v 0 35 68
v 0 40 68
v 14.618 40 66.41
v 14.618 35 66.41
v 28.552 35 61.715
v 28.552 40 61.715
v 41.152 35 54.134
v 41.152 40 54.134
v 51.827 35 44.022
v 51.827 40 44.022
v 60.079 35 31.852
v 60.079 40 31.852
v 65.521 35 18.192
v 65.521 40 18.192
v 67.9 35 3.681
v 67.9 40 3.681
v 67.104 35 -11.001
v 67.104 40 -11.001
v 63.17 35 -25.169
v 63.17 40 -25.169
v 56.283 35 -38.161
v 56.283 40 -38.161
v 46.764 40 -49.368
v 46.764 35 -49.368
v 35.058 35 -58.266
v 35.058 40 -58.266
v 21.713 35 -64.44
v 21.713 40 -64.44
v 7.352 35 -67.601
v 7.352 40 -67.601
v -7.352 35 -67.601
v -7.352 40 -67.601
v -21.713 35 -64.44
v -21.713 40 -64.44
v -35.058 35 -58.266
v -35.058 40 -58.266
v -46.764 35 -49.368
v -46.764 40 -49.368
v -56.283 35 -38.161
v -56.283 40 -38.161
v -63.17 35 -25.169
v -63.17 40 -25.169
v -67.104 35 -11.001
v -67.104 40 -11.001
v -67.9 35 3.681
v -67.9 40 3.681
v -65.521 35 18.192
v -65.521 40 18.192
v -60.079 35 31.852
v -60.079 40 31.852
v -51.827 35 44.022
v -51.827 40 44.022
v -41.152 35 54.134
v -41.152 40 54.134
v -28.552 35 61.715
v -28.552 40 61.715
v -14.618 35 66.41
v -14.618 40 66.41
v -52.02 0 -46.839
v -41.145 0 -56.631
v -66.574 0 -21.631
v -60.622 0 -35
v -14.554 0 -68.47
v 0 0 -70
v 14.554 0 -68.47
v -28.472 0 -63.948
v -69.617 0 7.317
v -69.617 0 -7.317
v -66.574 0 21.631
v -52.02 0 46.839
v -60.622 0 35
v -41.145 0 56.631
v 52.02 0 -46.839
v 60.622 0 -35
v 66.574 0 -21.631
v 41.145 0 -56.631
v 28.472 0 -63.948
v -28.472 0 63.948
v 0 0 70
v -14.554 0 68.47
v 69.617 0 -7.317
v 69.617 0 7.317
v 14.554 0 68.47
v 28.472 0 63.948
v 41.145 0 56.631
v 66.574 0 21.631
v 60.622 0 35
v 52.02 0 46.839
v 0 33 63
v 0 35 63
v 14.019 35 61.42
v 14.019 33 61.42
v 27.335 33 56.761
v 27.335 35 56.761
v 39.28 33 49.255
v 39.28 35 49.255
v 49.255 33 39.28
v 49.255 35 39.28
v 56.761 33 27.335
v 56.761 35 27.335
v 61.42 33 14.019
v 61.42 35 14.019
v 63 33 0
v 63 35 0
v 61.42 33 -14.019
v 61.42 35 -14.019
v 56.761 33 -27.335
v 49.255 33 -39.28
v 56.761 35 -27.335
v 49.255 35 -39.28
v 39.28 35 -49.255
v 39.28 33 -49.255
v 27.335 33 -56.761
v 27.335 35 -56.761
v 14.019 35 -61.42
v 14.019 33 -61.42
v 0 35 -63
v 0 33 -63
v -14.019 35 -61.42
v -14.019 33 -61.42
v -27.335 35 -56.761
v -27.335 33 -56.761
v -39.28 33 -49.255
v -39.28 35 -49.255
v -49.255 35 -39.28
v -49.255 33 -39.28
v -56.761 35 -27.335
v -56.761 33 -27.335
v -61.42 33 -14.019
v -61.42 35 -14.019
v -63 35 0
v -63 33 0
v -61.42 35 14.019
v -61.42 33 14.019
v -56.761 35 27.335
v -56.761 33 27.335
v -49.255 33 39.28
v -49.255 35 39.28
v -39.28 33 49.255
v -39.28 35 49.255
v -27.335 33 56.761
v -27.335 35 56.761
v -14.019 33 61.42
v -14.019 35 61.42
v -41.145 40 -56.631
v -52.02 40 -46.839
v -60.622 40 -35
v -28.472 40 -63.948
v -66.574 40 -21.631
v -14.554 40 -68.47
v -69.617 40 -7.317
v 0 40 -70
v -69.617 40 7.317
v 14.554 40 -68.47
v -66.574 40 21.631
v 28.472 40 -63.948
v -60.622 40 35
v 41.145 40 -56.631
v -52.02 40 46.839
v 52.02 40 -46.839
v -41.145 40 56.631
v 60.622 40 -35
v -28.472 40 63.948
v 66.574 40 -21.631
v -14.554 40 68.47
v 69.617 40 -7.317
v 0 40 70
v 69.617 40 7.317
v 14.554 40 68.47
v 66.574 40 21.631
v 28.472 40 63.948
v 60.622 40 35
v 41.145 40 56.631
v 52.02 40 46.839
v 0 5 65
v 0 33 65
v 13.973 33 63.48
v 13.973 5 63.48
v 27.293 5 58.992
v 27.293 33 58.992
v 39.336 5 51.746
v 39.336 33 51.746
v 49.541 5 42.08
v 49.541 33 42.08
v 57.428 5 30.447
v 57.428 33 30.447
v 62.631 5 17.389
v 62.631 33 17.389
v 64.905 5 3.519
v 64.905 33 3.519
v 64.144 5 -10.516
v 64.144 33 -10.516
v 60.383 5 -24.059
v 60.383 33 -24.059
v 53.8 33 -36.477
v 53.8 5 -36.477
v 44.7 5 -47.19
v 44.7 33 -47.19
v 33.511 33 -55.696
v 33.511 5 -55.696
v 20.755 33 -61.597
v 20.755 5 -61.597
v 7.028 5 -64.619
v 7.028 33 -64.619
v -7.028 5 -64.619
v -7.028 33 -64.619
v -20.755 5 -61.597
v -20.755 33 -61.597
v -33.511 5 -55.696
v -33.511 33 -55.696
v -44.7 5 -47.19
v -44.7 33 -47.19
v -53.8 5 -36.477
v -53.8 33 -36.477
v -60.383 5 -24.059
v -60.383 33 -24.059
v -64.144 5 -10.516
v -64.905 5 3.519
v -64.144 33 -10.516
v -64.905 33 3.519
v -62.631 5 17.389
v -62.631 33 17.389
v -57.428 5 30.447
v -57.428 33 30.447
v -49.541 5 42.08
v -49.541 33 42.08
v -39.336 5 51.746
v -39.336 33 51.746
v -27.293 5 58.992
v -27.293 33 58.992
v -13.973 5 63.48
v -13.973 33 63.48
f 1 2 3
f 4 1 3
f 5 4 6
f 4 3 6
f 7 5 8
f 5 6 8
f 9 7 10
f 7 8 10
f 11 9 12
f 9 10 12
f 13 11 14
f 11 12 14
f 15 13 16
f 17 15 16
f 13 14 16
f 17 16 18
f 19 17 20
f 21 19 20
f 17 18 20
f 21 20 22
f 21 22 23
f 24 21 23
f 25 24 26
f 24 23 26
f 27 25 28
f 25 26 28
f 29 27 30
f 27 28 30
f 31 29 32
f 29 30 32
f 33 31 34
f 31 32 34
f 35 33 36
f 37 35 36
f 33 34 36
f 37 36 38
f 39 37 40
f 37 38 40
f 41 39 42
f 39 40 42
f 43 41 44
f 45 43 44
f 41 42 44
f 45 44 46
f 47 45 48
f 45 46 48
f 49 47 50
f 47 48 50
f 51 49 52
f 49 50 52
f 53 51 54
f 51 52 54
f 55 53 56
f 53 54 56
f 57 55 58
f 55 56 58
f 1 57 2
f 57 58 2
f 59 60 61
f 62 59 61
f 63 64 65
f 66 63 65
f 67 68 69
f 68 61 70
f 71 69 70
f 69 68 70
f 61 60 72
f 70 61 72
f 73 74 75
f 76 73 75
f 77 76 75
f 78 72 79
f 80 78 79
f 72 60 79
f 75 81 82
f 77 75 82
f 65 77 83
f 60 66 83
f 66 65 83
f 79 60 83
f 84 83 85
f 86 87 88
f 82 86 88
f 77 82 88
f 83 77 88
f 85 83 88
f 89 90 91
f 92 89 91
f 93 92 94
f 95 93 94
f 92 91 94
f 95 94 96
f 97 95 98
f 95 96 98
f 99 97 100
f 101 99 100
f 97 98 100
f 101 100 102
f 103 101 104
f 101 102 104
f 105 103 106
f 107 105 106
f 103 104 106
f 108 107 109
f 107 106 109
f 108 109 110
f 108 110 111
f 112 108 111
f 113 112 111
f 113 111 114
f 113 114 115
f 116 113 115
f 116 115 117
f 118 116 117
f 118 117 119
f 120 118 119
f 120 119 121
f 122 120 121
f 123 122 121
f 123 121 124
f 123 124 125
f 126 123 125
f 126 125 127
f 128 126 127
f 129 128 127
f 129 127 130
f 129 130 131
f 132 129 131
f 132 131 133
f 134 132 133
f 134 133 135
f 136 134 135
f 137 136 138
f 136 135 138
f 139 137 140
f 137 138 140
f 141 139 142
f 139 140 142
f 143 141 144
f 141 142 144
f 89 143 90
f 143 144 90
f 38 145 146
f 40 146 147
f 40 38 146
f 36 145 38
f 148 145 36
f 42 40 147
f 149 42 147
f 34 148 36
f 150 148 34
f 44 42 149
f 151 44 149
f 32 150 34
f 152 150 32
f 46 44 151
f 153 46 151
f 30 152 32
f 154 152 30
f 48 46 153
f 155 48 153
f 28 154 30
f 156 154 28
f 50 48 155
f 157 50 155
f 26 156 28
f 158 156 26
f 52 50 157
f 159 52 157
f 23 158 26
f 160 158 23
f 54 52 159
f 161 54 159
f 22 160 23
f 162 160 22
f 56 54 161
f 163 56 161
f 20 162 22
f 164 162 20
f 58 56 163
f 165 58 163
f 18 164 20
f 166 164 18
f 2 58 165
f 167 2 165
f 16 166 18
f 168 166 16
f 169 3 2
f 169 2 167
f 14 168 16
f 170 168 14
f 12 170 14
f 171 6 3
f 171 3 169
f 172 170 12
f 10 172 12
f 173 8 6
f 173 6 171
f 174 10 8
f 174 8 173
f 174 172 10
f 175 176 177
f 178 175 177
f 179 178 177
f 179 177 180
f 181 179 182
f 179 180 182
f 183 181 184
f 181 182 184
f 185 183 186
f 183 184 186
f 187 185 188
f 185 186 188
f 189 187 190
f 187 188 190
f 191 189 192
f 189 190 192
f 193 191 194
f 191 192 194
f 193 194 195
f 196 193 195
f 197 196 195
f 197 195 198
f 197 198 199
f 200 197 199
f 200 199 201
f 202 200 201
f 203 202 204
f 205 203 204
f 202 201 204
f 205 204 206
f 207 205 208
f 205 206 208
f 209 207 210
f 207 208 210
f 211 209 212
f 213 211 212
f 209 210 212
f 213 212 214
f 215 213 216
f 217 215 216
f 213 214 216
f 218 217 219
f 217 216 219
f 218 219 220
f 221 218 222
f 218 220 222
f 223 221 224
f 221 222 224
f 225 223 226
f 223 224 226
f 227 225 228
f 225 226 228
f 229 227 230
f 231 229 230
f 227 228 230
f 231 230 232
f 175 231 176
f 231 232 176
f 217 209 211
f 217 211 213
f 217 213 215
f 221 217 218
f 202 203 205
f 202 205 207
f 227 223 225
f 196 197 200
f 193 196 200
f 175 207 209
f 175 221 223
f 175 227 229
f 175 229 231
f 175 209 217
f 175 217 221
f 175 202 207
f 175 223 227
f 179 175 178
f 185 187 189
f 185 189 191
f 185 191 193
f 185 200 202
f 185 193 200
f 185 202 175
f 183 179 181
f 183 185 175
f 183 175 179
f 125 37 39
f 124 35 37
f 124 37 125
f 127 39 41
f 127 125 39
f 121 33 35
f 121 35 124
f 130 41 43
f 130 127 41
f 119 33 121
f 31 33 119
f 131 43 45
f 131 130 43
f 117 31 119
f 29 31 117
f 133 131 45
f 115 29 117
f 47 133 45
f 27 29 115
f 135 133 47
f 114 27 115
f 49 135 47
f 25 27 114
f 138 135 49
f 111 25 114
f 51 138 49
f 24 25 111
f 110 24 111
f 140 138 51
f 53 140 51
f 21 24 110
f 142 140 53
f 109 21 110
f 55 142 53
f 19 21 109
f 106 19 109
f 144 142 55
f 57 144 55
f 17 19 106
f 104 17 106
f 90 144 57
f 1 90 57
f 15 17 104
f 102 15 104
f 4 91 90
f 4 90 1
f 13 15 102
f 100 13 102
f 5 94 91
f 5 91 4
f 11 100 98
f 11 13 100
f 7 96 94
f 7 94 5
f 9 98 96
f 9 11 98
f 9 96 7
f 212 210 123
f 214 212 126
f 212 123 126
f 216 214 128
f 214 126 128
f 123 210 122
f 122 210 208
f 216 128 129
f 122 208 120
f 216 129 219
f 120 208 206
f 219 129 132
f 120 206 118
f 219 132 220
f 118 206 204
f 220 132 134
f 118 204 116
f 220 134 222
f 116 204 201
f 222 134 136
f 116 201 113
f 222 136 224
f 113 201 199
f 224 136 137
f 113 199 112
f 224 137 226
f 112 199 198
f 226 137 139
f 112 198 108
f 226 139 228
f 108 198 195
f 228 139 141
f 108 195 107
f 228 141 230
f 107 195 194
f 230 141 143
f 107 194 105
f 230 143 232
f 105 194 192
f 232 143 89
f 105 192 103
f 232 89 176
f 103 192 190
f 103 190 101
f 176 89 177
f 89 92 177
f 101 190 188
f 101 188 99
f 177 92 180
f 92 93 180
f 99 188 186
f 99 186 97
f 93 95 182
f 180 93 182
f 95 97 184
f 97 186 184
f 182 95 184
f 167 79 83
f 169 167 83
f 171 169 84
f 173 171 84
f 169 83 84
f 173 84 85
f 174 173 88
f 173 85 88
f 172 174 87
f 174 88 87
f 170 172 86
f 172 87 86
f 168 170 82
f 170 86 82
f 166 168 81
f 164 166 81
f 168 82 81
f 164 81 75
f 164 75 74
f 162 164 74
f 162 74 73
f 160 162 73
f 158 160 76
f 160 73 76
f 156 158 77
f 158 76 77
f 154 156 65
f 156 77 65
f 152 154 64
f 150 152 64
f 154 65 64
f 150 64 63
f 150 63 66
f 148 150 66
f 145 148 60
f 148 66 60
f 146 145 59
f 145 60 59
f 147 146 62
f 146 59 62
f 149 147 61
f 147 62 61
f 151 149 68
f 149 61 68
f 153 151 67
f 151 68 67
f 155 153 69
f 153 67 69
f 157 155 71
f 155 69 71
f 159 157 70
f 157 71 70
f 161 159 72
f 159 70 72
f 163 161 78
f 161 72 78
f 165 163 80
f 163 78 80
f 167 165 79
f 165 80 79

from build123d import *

# Parameters (mm, degrees)
SKETCH2_R           = 70
BOSS_EXTRUDE1_DEPTH = 40
SKETCH4_R           = 63
CUT_EXTRUDE1_DEPTH  = 35
SKETCH5_R           = 68
CUT_EXTRUDE2_DEPTH  = 5
SKETCH6_R           = 65
CUT_EXTRUDE3_DEPTH  = 28


with BuildPart() as part:
    # Sketch2 → Boss-Extrude1 (new body)
    with BuildSketch(Plane(origin=(0, 0, 0), x_dir=(1, 0, 0), z_dir=(0, 1, 0))):
        with Locations(Location((0, 0, 0), (0, 0, 270))):
            Circle(SKETCH2_R)
    extrude(amount=BOSS_EXTRUDE1_DEPTH)

    # Sketch4 → Cut-Extrude1 (cut)
    with BuildSketch(Plane(origin=(0, 40, 0), x_dir=(1, 0, 0), z_dir=(0, 1, 0))):
        with Locations(Location((0, 0, 0), (0, 0, 270))):
            Circle(SKETCH4_R)
    extrude(amount=-CUT_EXTRUDE1_DEPTH, mode=Mode.SUBTRACT)

    # Sketch5 → Cut-Extrude2 (cut)
    with BuildSketch(Plane(origin=(0, 40, 0), x_dir=(1, 0, 0), z_dir=(0, 1, 0))):
        with Locations(Location((0, 0, 0), (0, 0, 270))):
            Circle(SKETCH5_R)
    extrude(amount=-CUT_EXTRUDE2_DEPTH, mode=Mode.SUBTRACT)

    # Sketch6 → Cut-Extrude3 (cut)
    with BuildSketch(Plane(origin=(0, 33, 0), x_dir=(1, 0, 0), z_dir=(0, 1, 0))):
        with Locations(Location((0, 0, 0), (0, 0, 270))):
            Circle(SKETCH6_R)
    extrude(amount=-CUT_EXTRUDE3_DEPTH, mode=Mode.SUBTRACT)


solid = part.part
